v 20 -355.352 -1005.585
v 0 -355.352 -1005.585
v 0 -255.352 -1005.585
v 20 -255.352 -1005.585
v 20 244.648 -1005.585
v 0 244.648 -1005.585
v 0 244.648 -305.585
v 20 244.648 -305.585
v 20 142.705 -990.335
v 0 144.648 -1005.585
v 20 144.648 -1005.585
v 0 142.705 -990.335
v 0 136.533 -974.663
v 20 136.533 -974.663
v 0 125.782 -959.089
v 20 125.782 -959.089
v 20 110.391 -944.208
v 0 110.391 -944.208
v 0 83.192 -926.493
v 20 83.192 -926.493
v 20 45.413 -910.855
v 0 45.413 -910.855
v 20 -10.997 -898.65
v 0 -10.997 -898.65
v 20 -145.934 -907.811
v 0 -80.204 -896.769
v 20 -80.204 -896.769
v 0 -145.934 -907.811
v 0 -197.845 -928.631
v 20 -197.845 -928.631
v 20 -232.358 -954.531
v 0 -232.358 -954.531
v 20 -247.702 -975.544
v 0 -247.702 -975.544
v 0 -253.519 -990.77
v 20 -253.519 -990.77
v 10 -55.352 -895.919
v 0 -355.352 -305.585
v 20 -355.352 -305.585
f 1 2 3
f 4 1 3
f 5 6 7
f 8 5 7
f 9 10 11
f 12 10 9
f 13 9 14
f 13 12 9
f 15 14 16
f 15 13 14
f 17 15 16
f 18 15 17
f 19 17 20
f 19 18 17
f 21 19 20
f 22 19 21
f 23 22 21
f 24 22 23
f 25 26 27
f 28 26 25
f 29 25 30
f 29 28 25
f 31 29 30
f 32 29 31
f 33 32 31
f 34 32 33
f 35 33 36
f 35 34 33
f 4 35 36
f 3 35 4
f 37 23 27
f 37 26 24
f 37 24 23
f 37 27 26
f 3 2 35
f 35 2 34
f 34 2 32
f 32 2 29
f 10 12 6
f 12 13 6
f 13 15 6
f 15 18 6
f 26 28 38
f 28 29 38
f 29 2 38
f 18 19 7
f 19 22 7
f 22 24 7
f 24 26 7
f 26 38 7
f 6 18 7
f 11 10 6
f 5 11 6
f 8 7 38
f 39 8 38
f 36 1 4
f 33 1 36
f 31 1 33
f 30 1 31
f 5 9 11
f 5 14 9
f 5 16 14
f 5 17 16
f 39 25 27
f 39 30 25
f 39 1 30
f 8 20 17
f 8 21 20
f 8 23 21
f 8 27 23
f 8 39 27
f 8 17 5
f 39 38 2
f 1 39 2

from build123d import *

# Parameters (mm, degrees)
F1_DEPTH = 20


with BuildPart() as f1:
    # F0 (on Right) → F1 (new body)
    with BuildSketch(Plane.YZ):
        with BuildLine():
            Line((244.647855, -305.585462), (-355.352145, -305.585462))
            Line((-355.352145, -305.585462), (-355.352145, -1005.585462))
            Line((-355.352145, -1005.585462), (-255.352145, -1005.585462))
            add(Edge.make_bspline(
                [(144.647855, -1005.585462), (144.647855, -895.918667), (-55.352145, -895.918667), (-255.352145, -895.918667), (-255.352145, -1005.585462)],
                knots=[0, 0, 0, 1.570796, 1.570796, 3.141593, 3.141593, 3.141593], degree=2, weights=[1, 0.707107, 1, 0.707107, 1]))
            Line((144.647855, -1005.585462), (244.647855, -1005.585462))
            Line((244.647855, -1005.585462), (244.647855, -305.585462))
        make_face()
    extrude(amount=F1_DEPTH)


solid = f1.part
